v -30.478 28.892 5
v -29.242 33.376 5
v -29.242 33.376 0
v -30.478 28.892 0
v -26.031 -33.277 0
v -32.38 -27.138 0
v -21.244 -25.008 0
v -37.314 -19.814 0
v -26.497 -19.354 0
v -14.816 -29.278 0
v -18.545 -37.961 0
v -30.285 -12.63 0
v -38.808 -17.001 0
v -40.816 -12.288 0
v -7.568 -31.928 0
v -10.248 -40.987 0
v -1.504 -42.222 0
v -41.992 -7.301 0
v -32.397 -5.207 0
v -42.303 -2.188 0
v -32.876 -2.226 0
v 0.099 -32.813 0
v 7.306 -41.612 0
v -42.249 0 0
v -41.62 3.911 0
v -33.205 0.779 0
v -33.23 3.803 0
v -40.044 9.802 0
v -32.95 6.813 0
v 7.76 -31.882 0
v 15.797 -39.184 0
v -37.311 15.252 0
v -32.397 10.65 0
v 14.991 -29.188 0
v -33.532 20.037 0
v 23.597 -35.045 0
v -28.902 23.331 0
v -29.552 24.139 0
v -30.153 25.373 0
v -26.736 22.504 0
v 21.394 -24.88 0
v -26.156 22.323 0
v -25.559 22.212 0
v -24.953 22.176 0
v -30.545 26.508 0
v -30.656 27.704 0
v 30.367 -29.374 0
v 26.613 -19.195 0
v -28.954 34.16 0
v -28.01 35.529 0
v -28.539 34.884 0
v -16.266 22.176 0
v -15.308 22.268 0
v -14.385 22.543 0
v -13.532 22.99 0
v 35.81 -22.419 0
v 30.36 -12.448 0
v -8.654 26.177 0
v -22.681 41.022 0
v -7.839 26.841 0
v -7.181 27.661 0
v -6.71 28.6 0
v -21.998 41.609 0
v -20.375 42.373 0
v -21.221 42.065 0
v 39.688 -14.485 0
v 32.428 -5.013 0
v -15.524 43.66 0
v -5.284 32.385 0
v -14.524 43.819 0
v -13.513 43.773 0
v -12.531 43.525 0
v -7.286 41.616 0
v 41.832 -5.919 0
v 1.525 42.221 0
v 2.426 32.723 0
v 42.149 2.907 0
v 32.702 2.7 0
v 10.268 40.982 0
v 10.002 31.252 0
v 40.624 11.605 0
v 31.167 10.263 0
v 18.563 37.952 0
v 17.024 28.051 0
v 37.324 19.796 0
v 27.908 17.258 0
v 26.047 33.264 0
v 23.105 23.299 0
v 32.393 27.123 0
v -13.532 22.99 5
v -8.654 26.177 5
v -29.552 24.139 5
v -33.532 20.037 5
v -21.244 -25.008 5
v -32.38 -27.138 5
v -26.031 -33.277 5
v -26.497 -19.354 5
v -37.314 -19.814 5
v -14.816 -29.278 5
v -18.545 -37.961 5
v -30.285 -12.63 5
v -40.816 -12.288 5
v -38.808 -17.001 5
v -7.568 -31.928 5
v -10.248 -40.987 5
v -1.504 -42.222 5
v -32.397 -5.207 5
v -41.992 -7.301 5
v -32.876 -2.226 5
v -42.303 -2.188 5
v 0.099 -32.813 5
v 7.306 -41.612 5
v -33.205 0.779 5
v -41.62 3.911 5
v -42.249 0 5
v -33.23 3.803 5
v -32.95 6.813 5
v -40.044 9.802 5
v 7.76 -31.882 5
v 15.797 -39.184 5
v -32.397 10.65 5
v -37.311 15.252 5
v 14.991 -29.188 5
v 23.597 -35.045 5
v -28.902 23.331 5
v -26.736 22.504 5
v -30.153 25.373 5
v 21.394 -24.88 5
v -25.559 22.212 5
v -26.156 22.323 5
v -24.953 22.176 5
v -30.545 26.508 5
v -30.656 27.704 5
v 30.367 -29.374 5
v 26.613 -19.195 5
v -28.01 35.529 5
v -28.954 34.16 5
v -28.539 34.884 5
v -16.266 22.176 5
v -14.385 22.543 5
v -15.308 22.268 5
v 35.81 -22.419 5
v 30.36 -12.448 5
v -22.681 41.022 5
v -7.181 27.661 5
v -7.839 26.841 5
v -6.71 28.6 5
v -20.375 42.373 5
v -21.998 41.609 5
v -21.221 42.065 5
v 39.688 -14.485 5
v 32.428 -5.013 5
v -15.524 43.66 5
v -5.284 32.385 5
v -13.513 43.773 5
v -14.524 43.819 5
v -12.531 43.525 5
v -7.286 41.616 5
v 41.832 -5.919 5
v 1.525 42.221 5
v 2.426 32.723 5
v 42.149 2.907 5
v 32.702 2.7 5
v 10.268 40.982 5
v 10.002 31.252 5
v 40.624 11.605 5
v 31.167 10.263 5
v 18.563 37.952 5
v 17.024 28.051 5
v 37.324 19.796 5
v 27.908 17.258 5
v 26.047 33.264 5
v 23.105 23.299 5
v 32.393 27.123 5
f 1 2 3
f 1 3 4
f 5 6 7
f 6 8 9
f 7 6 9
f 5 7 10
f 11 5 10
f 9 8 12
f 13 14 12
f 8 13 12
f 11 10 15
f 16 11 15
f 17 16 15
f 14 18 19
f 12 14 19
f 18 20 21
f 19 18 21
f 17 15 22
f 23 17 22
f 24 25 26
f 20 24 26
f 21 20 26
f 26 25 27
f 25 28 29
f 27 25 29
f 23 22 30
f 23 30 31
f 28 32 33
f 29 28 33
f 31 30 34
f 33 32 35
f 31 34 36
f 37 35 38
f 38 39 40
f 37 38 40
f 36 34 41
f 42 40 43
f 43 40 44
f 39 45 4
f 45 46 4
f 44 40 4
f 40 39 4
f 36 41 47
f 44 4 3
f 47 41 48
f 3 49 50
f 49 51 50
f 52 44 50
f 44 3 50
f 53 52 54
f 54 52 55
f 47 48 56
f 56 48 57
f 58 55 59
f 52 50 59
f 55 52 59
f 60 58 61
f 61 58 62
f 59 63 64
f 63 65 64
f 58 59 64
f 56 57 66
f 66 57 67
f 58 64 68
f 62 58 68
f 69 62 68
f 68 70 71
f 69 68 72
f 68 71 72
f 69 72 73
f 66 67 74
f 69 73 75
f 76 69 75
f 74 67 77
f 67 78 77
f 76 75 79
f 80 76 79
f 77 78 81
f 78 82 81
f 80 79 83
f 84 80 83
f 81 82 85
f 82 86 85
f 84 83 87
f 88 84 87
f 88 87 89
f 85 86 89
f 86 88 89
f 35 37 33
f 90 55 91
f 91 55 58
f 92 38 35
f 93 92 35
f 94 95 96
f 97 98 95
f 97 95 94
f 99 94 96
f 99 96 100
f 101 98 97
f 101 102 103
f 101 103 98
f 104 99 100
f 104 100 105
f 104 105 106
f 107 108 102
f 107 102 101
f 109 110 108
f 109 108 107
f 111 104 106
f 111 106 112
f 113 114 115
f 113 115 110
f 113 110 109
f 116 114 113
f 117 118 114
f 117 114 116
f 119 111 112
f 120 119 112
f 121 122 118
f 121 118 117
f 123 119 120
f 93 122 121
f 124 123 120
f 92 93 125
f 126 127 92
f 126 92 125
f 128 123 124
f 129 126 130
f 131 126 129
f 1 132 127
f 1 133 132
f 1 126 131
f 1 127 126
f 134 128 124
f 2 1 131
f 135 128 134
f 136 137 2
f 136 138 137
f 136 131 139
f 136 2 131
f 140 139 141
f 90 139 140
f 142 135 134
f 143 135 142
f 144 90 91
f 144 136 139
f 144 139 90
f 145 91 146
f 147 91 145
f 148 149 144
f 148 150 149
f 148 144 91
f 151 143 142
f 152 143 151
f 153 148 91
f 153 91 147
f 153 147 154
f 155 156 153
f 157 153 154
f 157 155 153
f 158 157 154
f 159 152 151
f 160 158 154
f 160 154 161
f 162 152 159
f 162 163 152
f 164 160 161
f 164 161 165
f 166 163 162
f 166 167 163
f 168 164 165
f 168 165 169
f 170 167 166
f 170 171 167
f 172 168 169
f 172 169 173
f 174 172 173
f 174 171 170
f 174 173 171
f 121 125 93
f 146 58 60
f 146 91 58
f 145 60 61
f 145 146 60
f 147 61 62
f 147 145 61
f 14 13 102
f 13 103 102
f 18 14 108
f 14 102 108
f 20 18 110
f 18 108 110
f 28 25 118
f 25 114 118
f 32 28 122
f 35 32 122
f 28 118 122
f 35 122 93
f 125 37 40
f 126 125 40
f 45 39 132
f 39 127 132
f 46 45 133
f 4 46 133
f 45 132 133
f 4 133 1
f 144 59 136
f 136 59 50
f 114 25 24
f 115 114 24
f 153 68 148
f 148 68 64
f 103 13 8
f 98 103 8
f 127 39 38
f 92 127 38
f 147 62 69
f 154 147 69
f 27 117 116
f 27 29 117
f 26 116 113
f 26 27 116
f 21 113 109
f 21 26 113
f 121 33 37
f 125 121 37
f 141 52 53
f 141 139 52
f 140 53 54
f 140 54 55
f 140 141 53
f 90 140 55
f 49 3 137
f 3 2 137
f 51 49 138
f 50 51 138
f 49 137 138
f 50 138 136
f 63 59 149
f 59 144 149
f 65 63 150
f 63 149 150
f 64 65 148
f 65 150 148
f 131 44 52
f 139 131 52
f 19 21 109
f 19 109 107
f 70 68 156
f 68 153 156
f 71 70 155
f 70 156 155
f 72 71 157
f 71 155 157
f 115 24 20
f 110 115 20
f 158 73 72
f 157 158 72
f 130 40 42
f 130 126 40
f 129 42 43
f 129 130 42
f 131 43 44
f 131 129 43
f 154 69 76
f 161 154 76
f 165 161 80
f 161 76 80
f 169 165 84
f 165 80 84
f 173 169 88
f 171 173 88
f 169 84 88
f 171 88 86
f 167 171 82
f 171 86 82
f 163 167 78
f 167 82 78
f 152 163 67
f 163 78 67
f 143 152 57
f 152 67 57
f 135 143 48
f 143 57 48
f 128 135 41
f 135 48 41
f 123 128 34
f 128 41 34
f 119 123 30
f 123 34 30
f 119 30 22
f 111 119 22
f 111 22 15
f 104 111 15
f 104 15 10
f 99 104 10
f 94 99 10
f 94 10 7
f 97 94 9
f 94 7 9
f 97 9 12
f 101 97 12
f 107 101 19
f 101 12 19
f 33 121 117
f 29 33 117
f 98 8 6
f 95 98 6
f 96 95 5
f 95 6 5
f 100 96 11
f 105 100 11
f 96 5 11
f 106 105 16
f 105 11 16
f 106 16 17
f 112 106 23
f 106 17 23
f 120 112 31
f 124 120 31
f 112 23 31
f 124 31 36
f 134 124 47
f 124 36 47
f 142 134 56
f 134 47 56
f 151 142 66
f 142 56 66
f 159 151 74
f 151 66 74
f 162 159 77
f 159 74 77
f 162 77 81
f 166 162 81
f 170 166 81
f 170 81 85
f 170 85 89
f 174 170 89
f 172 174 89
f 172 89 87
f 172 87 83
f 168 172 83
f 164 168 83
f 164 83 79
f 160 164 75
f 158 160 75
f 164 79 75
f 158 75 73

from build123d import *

# Parameters (mm, degrees)
F1_DEPTH = 5
F2_R     = 30
F4_DEPTH = 5.001
F5_R     = 30
F6_R     = 30
F7_R     = 5
F8_R     = 5
F9_R     = 5
F10_R    = 5


with BuildPart() as f1:
    # F0 (on Top) → F1 (new body)
    with BuildSketch(Plane.XY):
        with BuildLine():
            Line((-42.497829, -10.052536), (-37.314063, -19.814464))
            ThreePointArc((-37.314063, -19.814464), (37.956578, -18.553988), (-7.285654, 41.615761))
            Line((-7.285654, 41.615761), (-14.006471, 44.062227))
            Line((-14.006471, 44.062227), (-21.715557, 42.017373))
            Line((-21.715557, 42.017373), (-28.90164, 34.610507))
            Line((-28.90164, 34.610507), (-30.980071, 27.070666))
            Line((-30.980071, 27.070666), (-29.551746, 24.139418))
            Line((-29.551746, 24.139418), (-40.117525, 13.249019))
            Line((-40.117525, 13.249019), (-42.248696, 0))
            Line((-42.248696, 0), (-42.497829, -10.052536))
        make_face()
        with BuildLine():
            ThreePointArc((-5.28408, 32.384846), (26.613249, -19.194653), (-32.397266, -5.207392))
            Line((-32.397266, -5.207392), (-32.397266, 10.650216))
            Line((-32.397266, 10.650216), (-28.90164, 23.331157))
            Line((-28.90164, 23.331157), (-25.874414, 22.175578))
            Line((-25.874414, 22.175578), (-14.777807, 22.175578))
            Line((-14.777807, 22.175578), (-7.285654, 27.070666))
            Line((-7.285654, 27.070666), (-5.28408, 32.384846))
        make_face(mode=Mode.SUBTRACT)
    extrude(amount=F1_DEPTH)

    # F2
    f2_edges = [f1.edges().sort_by_distance(p)[0] for p in [
        (-42.497829, -10.052536, 2.5),
    ]]
    fillet(f2_edges, radius=F2_R)

    # F3 (on face) → F4 (cut, through all)
    with BuildSketch(Plane.XY.offset(5)):
        Polygon((-33.602018, 2.287856), (-32.397266, -5.207392), (-32.397266, 10.650216), align=None)
    extrude(amount=-F4_DEPTH, mode=Mode.SUBTRACT)

    # F5
    f5_edges = [f1.edges().sort_by_distance(p)[0] for p in [
        (-40.117525, 13.249019, 2.5),
    ]]
    fillet(f5_edges, radius=F5_R)

    # F6
    f6_edges = [f1.edges().sort_by_distance(p)[0] for p in [
        (-33.602018, 2.287856, 2.5),
    ]]
    fillet(f6_edges, radius=F6_R)

    # F7
    f7_edges = [f1.edges().sort_by_distance(p)[0] for p in [
        (-30.980071, 27.070666, 2.5),
    ]]
    fillet(f7_edges, radius=F7_R)

    # F8
    f8_edges = [f1.edges().sort_by_distance(p)[0] for p in [
        (-25.874414, 22.175578, 2.5),
    ]]
    fillet(f8_edges, radius=F8_R)

    # F9
    f9_edges = [f1.edges().sort_by_distance(p)[0] for p in [
        (-28.90164, 34.610507, 2.5),
        (-21.715557, 42.017373, 2.5),
        (-14.006471, 44.062227, 2.5),
    ]]
    fillet(f9_edges, radius=F9_R)

    # F10
    f10_edges = [f1.edges().sort_by_distance(p)[0] for p in [
        (-14.777807, 22.175578, 2.5),
        (-7.285654, 27.070666, 2.5),
    ]]
    fillet(f10_edges, radius=F10_R)


solid = f1.part
